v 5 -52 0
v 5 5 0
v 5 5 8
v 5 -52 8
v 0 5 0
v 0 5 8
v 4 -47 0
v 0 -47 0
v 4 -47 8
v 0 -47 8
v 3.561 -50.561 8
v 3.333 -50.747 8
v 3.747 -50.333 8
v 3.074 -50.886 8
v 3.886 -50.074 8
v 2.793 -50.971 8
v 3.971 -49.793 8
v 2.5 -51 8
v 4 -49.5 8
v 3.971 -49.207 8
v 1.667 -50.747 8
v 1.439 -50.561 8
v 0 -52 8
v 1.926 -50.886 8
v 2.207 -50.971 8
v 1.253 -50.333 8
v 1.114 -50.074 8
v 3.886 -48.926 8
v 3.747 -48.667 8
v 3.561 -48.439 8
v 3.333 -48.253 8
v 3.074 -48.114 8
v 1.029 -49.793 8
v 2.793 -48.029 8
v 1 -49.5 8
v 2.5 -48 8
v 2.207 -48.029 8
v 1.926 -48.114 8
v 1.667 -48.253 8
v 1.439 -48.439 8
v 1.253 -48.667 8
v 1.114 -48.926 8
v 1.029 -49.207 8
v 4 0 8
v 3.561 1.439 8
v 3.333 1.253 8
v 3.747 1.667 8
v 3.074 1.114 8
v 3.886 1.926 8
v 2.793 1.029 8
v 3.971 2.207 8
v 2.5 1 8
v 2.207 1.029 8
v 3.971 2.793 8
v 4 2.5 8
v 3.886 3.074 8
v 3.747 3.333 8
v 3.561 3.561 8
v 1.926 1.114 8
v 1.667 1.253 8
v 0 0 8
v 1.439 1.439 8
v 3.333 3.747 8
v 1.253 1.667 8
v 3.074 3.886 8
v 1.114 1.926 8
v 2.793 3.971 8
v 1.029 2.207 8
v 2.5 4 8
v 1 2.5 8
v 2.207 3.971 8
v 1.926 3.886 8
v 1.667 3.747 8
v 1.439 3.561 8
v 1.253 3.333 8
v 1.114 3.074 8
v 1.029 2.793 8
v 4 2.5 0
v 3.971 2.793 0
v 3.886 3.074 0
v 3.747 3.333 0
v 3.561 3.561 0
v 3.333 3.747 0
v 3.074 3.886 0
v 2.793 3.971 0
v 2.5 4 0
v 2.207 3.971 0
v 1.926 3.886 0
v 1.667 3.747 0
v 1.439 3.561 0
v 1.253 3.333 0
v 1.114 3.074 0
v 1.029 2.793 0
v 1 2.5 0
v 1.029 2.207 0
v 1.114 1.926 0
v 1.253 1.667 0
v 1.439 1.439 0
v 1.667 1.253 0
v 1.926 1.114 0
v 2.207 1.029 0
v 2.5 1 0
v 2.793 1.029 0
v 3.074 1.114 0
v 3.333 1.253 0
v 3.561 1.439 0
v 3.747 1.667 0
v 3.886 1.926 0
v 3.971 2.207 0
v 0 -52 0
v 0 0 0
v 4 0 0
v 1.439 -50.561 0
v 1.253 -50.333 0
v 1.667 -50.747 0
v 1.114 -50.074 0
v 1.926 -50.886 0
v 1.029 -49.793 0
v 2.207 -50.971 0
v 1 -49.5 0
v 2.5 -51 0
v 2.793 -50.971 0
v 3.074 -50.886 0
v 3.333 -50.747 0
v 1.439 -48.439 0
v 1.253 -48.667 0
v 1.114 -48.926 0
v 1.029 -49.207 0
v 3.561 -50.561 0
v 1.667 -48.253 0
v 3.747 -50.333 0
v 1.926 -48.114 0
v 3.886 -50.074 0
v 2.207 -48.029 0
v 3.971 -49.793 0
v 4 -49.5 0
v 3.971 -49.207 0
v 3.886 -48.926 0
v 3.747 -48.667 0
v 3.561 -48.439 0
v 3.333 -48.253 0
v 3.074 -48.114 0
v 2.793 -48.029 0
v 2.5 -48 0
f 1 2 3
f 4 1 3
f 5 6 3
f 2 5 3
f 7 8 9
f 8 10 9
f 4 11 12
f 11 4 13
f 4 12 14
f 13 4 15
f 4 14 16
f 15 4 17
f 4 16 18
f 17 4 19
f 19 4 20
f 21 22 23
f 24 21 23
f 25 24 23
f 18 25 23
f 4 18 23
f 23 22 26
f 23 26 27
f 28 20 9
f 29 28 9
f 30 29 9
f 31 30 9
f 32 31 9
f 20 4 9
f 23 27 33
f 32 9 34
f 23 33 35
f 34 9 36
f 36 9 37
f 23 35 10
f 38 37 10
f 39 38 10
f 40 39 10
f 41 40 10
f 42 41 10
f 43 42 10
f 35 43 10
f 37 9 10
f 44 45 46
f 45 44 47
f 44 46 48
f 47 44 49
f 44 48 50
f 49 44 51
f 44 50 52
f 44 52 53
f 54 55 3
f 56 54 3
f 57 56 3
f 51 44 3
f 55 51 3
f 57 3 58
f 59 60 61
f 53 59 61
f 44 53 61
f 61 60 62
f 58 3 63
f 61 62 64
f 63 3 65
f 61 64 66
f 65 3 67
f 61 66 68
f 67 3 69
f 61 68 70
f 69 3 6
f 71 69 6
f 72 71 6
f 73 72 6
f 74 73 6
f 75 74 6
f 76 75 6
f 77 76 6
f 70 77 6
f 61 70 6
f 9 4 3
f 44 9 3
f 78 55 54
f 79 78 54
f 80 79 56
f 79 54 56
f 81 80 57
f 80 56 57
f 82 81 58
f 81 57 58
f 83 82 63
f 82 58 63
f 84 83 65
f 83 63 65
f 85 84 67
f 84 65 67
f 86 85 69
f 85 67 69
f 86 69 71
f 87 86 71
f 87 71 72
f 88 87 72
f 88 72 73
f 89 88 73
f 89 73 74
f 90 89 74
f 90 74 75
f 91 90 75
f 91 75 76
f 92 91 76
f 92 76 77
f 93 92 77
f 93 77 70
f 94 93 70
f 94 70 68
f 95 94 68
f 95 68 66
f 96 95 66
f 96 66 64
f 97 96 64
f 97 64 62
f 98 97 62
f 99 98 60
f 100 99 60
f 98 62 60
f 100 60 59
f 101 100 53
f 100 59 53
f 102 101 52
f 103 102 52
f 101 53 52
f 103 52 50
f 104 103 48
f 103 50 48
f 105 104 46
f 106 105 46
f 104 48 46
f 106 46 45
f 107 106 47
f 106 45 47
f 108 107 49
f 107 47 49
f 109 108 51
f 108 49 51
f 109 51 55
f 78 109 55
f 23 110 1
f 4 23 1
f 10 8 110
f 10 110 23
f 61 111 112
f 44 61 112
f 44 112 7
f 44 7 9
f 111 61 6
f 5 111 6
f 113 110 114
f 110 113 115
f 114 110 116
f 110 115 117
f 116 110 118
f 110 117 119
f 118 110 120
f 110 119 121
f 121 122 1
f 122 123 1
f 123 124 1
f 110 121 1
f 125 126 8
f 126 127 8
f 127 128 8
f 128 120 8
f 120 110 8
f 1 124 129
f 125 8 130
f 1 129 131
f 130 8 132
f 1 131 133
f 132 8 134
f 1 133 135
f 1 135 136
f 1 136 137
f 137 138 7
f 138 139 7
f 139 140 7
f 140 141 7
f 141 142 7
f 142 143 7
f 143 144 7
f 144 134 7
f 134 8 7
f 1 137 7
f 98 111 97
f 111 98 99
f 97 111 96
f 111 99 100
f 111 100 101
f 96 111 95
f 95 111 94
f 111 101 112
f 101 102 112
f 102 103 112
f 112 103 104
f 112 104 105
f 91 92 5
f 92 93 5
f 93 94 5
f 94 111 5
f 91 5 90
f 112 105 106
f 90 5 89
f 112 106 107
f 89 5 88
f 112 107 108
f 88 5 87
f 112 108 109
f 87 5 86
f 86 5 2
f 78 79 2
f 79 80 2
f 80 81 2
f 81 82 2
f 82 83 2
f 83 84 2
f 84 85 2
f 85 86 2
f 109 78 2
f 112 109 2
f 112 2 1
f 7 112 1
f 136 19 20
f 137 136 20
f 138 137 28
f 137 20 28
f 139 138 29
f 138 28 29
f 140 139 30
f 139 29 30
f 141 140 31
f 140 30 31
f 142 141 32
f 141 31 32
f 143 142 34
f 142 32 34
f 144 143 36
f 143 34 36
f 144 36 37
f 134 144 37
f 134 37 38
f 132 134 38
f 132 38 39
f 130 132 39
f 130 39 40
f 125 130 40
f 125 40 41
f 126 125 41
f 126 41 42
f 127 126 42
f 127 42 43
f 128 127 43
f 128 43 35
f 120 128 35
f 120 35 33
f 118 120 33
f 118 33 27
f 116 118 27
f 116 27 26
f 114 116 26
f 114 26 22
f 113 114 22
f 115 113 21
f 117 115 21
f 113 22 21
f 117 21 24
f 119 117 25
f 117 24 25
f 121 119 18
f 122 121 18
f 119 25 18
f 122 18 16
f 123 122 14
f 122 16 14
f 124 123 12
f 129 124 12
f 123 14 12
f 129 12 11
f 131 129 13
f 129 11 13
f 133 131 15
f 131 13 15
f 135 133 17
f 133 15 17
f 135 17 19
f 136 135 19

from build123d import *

# Parameters (mm, degrees)
F0_W     = 5
F0_H     = 5
F1_DEPTH = 8
F2_R     = 1.5
F3_DEPTH = 25
F4_W     = 1
F4_H     = 8
F5_DEPTH = 47
F6_W     = 1
F6_H     = 8
F6_W_2   = 4
F7_DEPTH = 5
F8_R     = 1.5
F9_DEPTH = 25


with BuildPart() as f1:
    # F0 (on Top) → F1 (new body)
    with BuildSketch(Plane.XY):
        with Locations((2.5, 2.5)):
            Rectangle(F0_W, F0_H)
    extrude(amount=F1_DEPTH)

    # F2 (on face) → F3 (cut)
    with BuildSketch(Plane.XY.offset(8)):
        with Locations((2.5, 2.5)):
            Circle(F2_R)
    extrude(amount=-F3_DEPTH, mode=Mode.SUBTRACT)

    # F4 (on face) → F5 (join)
    with BuildSketch(Plane.XZ):
        with Locations((4.5, 4)):
            Rectangle(F4_W, F4_H)
    extrude(amount=F5_DEPTH)

    # F6 (on face) → F7 (join)
    with BuildSketch(Plane.XZ.offset(47)):
        with Locations((4.5, 4)):
            Rectangle(F6_W, F6_H)
        with Locations((2, 4)):
            Rectangle(F6_W_2, F6_H)
    extrude(amount=F7_DEPTH)

    # F8 (on face) → F9 (cut)
    with BuildSketch(Plane.XY.offset(8)):
        with Locations((2.5, -49.5)):
            Circle(F8_R)
    extrude(amount=-F9_DEPTH, mode=Mode.SUBTRACT)


solid = f1.part
